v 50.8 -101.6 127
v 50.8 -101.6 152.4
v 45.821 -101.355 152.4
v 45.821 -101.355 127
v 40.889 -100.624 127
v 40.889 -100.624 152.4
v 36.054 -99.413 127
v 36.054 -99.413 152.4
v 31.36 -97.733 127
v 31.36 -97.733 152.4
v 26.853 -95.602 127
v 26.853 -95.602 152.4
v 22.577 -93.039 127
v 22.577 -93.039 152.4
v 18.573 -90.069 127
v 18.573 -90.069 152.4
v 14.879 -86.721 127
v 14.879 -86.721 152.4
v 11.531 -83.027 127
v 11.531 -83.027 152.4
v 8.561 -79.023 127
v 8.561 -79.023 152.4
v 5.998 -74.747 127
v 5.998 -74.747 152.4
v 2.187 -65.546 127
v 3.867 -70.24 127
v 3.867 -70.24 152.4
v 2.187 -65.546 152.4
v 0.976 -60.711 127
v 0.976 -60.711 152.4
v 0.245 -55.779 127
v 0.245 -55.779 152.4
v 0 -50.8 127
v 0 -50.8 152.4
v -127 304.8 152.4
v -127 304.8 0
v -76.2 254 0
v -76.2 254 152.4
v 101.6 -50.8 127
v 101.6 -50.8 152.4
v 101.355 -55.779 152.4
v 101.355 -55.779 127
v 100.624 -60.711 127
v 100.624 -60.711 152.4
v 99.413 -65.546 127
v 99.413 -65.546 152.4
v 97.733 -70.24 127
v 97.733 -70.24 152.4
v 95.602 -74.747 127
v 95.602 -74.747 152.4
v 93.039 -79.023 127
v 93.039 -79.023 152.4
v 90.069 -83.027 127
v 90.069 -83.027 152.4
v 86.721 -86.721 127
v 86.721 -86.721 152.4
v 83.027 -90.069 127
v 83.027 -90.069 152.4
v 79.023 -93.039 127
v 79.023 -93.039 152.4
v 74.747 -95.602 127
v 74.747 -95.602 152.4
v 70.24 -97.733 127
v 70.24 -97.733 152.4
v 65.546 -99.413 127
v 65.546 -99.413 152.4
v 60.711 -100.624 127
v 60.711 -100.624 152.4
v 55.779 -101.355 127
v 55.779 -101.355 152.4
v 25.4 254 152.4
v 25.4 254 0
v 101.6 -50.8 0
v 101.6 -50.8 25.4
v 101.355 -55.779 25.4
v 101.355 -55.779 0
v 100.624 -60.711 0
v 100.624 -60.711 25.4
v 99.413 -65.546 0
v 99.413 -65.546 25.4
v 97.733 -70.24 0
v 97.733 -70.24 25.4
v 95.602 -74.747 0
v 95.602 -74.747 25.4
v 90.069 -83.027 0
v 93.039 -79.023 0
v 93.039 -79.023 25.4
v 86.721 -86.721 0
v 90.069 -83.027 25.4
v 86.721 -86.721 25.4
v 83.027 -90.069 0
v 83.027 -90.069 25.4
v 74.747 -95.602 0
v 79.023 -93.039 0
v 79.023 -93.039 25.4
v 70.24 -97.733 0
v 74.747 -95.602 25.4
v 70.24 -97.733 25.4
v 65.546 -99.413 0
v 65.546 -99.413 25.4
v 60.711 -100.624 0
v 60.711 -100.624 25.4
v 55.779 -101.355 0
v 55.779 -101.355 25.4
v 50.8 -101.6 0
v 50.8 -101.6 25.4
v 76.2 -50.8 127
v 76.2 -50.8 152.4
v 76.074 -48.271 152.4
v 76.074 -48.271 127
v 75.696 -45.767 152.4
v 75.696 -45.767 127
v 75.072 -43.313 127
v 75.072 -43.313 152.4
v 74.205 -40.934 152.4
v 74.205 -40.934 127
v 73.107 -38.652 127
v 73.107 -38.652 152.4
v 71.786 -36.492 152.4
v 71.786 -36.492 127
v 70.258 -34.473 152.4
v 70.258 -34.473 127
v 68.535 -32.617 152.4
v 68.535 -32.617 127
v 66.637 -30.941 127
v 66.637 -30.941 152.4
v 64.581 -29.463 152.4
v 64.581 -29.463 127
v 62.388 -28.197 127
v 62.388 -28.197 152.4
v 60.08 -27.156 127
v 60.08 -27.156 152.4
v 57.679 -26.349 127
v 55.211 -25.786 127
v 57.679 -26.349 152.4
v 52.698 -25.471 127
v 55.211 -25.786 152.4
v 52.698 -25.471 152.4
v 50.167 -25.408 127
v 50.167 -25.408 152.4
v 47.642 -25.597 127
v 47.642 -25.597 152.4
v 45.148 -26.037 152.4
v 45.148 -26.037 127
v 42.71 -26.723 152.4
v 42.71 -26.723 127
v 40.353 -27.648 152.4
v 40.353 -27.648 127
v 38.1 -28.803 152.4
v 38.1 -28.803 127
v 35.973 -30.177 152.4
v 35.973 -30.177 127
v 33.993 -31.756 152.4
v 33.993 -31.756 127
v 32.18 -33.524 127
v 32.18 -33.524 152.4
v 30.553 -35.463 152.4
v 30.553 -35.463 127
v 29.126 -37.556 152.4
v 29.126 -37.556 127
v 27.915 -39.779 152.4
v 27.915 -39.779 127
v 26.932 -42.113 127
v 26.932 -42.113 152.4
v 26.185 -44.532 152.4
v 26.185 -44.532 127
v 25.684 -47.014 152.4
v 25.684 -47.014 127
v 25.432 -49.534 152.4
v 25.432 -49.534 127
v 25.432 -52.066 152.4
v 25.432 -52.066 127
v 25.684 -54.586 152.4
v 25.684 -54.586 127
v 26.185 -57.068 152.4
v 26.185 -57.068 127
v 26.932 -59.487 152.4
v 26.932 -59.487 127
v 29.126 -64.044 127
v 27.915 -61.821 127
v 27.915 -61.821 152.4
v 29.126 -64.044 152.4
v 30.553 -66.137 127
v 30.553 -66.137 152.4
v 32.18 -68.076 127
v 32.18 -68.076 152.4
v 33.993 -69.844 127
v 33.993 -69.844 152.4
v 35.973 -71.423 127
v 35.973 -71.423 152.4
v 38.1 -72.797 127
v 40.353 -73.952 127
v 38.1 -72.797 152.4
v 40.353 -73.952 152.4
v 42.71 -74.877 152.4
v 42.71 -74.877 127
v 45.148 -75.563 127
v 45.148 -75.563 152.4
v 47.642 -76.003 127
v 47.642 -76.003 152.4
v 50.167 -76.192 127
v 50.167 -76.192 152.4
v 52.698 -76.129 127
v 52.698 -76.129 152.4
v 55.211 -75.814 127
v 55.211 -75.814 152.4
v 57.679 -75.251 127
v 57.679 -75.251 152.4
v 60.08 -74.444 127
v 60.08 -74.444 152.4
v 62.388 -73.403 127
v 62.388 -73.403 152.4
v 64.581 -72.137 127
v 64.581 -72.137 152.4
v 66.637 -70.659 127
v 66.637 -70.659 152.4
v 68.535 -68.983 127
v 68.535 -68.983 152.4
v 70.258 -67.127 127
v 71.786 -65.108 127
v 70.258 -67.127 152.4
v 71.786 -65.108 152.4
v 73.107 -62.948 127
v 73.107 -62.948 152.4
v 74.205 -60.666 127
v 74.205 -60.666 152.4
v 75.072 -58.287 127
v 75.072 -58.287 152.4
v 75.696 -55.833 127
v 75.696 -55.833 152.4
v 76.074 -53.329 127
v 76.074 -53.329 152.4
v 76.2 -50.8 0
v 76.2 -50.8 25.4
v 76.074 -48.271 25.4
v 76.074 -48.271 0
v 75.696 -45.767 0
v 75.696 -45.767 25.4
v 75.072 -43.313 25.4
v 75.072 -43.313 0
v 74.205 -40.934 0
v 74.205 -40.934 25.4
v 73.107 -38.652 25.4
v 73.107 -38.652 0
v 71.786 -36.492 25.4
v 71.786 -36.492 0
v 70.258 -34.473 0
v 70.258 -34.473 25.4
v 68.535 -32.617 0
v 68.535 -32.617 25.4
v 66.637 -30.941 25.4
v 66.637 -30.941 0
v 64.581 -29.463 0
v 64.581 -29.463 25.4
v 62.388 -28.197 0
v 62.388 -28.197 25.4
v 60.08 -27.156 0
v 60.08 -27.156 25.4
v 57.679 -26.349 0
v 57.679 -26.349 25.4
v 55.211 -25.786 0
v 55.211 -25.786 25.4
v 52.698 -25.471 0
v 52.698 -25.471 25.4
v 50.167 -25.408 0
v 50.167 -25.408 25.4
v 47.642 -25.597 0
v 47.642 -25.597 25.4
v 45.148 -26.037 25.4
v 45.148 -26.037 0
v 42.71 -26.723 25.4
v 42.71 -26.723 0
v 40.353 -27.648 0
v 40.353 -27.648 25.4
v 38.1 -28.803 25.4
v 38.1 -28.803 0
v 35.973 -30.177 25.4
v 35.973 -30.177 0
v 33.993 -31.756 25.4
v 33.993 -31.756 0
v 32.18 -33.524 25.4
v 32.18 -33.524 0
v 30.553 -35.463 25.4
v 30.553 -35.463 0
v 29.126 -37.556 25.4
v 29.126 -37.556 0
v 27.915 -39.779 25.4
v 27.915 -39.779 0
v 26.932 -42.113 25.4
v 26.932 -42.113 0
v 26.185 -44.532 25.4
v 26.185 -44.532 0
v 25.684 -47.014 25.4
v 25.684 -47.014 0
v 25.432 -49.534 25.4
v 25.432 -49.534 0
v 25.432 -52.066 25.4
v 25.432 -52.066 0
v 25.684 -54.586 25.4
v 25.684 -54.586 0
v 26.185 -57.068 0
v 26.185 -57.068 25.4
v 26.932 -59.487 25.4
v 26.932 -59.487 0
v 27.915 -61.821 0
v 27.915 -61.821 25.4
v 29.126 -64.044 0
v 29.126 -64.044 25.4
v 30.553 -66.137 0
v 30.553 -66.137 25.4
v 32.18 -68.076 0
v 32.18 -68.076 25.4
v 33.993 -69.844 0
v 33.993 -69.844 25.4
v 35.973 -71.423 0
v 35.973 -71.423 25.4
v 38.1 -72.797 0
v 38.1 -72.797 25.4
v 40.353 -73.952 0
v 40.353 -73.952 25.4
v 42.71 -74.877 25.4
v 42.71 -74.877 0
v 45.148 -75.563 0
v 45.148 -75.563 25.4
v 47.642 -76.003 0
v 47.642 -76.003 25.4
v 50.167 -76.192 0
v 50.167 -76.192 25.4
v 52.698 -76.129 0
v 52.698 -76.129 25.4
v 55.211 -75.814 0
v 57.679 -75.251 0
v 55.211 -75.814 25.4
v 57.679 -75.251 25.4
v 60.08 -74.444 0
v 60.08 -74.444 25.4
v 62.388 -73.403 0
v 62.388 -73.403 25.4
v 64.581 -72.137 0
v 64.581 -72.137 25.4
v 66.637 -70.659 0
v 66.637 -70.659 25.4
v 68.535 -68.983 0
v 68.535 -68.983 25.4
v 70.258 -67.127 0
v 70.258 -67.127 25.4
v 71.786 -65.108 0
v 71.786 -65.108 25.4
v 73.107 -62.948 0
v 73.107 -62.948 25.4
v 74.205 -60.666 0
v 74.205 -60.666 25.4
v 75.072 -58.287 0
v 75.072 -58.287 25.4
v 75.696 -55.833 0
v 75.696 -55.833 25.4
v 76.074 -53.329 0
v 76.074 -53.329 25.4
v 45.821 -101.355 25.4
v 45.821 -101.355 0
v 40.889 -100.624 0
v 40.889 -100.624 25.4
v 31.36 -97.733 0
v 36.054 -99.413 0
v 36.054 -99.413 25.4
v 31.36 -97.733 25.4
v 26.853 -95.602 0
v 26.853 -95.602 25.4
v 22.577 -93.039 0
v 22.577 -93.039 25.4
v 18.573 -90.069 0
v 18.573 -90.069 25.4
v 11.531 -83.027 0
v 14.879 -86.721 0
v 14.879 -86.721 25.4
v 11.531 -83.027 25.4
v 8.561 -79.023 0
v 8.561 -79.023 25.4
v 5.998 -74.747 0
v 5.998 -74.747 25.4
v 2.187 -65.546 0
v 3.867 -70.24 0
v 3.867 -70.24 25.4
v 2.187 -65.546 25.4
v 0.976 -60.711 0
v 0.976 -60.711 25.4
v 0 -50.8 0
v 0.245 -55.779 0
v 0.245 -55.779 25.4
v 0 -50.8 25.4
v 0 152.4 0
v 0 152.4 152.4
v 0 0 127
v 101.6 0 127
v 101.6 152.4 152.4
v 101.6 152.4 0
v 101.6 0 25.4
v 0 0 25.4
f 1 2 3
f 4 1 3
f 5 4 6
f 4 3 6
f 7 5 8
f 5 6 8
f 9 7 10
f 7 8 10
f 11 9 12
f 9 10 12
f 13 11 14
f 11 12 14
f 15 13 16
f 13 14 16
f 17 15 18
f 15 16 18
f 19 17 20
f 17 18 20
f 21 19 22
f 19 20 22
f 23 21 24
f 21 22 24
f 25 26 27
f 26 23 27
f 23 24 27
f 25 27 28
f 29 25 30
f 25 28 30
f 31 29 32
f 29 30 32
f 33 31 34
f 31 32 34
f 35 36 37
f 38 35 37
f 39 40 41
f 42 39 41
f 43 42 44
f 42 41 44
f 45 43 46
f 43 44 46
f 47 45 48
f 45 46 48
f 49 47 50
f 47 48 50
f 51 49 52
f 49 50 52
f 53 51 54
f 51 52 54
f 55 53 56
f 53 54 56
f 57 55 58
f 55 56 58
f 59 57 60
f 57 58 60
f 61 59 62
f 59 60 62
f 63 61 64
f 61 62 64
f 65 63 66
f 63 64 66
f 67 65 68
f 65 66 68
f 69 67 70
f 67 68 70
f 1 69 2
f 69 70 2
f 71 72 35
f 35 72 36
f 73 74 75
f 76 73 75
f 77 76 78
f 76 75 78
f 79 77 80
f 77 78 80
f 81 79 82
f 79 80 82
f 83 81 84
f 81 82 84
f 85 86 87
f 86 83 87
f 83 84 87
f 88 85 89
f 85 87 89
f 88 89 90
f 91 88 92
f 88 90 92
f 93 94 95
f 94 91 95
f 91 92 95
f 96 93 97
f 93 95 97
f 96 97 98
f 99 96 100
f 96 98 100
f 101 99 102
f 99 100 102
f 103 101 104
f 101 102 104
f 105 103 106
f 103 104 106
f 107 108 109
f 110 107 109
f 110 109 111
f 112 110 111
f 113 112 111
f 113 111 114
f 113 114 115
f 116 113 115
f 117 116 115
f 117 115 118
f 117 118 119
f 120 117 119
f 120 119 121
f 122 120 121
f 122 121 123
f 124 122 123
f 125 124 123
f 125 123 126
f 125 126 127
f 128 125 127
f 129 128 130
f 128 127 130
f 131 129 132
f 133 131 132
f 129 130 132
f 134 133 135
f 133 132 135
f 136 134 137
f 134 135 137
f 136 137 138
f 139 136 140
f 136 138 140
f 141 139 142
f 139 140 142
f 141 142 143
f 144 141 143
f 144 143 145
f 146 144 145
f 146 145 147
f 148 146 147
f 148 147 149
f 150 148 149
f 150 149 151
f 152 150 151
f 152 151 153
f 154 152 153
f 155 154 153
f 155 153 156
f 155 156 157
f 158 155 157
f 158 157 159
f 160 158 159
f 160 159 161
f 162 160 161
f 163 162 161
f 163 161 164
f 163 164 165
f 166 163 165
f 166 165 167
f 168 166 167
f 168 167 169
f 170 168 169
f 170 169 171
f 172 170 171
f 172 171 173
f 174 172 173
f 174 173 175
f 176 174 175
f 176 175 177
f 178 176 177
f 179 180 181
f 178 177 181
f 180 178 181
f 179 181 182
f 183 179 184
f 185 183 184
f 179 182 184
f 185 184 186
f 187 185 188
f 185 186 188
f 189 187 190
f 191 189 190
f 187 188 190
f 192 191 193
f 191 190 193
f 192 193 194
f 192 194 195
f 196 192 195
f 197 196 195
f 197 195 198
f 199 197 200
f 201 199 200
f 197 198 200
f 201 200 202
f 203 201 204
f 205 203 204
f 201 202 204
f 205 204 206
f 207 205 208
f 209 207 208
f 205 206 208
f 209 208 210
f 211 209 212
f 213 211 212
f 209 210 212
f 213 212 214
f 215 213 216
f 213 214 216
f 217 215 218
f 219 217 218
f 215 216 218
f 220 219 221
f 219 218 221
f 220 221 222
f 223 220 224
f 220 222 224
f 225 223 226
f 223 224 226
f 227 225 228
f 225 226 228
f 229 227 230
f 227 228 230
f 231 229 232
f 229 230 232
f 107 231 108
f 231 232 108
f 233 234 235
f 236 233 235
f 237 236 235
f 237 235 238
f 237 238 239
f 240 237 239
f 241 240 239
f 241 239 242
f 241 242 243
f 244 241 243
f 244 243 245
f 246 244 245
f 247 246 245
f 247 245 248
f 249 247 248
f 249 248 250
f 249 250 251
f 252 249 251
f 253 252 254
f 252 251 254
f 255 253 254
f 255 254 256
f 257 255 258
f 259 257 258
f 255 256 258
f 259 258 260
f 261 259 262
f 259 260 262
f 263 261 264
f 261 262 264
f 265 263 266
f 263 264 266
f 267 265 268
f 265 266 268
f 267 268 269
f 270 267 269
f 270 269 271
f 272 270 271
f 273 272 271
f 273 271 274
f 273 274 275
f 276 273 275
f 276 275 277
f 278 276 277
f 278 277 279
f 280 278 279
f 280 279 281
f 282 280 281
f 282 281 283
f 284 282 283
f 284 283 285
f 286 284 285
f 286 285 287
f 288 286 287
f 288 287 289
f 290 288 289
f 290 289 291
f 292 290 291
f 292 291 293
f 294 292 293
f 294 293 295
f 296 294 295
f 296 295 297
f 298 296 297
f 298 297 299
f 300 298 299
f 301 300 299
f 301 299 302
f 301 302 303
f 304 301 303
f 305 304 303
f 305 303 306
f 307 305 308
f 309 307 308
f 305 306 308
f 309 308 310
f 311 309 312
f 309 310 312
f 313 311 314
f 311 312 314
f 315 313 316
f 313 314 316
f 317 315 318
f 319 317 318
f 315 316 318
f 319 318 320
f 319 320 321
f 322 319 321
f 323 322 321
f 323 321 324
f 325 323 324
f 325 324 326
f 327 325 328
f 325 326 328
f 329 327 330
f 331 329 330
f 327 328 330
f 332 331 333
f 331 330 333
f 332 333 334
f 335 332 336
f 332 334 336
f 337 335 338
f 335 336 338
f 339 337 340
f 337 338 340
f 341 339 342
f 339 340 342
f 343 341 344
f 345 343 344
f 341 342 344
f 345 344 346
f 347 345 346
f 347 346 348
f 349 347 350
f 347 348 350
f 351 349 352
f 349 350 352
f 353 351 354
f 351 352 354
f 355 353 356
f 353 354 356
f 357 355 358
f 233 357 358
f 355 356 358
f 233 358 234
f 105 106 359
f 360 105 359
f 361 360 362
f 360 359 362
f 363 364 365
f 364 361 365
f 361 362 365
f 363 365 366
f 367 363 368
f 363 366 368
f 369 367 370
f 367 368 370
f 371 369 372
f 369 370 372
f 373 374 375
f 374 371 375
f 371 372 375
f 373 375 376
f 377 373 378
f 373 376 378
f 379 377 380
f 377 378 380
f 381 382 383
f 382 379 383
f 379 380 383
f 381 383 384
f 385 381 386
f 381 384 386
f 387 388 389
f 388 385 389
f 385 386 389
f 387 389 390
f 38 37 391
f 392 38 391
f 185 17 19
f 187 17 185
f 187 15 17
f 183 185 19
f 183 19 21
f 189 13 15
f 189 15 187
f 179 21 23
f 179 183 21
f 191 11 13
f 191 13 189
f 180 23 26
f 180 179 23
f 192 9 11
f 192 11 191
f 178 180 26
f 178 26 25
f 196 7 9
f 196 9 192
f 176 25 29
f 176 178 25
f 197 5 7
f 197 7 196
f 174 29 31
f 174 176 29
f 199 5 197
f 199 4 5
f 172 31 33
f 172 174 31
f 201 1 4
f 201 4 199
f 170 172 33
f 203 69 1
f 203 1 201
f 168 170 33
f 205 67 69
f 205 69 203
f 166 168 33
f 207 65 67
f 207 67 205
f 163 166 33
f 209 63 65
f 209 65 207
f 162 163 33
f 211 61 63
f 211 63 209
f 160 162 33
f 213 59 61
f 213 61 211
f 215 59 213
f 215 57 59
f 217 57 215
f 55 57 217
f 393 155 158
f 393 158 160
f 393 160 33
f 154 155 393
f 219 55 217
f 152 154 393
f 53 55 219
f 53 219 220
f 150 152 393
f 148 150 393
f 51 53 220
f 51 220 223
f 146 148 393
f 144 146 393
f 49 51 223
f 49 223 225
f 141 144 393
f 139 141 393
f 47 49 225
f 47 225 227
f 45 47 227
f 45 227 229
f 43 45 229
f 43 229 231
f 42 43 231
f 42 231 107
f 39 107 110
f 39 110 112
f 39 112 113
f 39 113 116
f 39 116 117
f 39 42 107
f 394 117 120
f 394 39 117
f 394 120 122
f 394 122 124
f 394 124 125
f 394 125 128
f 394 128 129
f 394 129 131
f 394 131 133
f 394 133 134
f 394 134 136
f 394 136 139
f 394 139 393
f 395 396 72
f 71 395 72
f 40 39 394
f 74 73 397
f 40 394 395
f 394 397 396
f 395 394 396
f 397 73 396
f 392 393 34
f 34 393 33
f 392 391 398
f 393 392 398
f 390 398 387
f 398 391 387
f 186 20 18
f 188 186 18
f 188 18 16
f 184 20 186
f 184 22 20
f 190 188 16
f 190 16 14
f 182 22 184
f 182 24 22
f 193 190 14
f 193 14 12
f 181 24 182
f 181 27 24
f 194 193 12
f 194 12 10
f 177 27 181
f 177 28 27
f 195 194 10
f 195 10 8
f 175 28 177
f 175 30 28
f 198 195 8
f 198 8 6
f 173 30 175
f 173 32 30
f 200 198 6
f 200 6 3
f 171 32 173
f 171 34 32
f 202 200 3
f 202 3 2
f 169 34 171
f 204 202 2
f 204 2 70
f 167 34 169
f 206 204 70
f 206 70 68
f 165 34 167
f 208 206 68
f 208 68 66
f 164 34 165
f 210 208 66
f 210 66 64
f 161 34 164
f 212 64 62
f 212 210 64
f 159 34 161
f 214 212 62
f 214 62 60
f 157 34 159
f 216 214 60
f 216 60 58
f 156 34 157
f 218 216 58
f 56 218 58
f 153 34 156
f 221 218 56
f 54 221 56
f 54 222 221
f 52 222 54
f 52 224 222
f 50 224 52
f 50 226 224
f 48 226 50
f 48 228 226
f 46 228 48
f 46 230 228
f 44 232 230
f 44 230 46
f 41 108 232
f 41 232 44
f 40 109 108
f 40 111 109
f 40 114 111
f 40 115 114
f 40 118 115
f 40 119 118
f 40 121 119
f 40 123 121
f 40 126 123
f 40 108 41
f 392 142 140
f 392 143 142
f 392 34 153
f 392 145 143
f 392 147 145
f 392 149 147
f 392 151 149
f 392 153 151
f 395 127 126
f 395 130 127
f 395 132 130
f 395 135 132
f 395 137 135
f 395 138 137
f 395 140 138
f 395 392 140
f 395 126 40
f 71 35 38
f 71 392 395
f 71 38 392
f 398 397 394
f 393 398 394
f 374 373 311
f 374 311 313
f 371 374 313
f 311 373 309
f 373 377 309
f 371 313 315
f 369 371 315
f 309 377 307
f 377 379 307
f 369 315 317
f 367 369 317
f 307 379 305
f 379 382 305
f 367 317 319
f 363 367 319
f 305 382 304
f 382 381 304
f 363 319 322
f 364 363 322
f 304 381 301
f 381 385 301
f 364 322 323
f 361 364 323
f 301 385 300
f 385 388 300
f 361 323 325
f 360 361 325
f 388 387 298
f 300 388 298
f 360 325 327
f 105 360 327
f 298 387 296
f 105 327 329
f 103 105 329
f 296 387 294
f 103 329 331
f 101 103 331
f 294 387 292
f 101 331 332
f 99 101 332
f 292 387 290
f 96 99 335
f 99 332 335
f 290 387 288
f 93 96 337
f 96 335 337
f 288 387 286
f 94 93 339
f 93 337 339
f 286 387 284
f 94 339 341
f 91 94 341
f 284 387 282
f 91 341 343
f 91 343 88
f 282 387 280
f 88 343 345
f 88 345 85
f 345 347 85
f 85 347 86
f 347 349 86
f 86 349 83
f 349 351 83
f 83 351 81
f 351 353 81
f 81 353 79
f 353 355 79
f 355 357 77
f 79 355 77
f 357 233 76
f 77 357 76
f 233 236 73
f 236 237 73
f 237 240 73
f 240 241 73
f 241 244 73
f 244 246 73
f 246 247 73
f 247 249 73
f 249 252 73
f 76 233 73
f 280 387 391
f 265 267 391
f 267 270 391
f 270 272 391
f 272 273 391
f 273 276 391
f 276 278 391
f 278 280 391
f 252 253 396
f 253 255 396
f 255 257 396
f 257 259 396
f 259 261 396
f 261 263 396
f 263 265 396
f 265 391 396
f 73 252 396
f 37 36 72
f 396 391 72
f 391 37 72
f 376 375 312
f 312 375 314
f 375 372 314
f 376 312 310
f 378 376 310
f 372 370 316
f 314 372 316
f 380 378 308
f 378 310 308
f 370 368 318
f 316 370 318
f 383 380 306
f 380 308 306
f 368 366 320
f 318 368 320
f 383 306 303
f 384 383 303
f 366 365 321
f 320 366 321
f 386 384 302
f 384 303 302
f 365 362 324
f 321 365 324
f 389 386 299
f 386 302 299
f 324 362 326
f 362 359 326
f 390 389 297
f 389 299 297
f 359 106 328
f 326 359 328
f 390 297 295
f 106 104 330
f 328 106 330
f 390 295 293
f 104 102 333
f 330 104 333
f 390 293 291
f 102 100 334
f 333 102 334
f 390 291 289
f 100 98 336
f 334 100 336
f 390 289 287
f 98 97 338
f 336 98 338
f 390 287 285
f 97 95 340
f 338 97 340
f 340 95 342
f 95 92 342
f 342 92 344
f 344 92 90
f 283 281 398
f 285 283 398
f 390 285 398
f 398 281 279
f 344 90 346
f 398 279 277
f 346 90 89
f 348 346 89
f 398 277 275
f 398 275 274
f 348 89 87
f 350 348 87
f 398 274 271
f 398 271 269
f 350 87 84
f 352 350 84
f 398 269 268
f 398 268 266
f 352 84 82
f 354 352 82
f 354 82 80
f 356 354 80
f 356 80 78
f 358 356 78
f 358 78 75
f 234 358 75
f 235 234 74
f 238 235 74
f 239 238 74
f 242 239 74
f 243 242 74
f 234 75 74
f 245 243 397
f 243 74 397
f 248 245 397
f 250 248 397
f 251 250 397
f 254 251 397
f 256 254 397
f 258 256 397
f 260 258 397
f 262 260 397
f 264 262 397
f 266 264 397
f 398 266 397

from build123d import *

# Parameters (mm, degrees)
F0_W     = 101.6
F0_H     = 152.4
F0_H_2   = 101.6
F1_DEPTH = 152.4
F2_W     = 101.6
F2_H     = 101.6
F3_DEPTH = 228.601
F4_R     = 25.4
F5_DEPTH = 152.401


with BuildPart() as f1:
    # F0 (on Top) → F1 (new body)
    with BuildSketch(Plane.XY):
        with Locations((50.8, 76.2)):
            Rectangle(F0_W, F0_H)
        with Locations((50.8, -50.8)):
            Rectangle(F0_W, F0_H_2)
        Polygon((-76.2, 254), (0, 152.4), (101.6, 152.4), (25.4, 254), align=None)
        Polygon((-127, 304.8), (-76.2, 254), (25.4, 254), align=None)
    extrude(amount=F1_DEPTH)

    # F2 (on face) → F3 (cut, through all)
    with BuildSketch(Plane.YZ.offset(101.6)):
        with Locations((-50.8, 76.2)):
            Rectangle(F2_W, F2_H)
    extrude(amount=-F3_DEPTH, mode=Mode.SUBTRACT)

    # F4 (on face) → F5 (cut, through all)
    with BuildSketch(Plane.XY.offset(152.4)):
        with Locations((50.8, -50.8)):
            Circle(F4_R)
        with BuildLine():
            ThreePointArc((101.6, -50.8), (86.721024, -86.721024), (50.8, -101.6))
            Line((50.8, -101.6), (101.6, -101.6))
            Line((101.6, -101.6), (101.6, -50.8))
        make_face()
        with BuildLine():
            ThreePointArc((50.8, -101.6), (14.878976, -86.721024), (0, -50.8))
            Line((0, -50.8), (0, -101.6))
            Line((0, -101.6), (50.8, -101.6))
        make_face()
    extrude(amount=-F5_DEPTH, mode=Mode.SUBTRACT)


solid = f1.part
